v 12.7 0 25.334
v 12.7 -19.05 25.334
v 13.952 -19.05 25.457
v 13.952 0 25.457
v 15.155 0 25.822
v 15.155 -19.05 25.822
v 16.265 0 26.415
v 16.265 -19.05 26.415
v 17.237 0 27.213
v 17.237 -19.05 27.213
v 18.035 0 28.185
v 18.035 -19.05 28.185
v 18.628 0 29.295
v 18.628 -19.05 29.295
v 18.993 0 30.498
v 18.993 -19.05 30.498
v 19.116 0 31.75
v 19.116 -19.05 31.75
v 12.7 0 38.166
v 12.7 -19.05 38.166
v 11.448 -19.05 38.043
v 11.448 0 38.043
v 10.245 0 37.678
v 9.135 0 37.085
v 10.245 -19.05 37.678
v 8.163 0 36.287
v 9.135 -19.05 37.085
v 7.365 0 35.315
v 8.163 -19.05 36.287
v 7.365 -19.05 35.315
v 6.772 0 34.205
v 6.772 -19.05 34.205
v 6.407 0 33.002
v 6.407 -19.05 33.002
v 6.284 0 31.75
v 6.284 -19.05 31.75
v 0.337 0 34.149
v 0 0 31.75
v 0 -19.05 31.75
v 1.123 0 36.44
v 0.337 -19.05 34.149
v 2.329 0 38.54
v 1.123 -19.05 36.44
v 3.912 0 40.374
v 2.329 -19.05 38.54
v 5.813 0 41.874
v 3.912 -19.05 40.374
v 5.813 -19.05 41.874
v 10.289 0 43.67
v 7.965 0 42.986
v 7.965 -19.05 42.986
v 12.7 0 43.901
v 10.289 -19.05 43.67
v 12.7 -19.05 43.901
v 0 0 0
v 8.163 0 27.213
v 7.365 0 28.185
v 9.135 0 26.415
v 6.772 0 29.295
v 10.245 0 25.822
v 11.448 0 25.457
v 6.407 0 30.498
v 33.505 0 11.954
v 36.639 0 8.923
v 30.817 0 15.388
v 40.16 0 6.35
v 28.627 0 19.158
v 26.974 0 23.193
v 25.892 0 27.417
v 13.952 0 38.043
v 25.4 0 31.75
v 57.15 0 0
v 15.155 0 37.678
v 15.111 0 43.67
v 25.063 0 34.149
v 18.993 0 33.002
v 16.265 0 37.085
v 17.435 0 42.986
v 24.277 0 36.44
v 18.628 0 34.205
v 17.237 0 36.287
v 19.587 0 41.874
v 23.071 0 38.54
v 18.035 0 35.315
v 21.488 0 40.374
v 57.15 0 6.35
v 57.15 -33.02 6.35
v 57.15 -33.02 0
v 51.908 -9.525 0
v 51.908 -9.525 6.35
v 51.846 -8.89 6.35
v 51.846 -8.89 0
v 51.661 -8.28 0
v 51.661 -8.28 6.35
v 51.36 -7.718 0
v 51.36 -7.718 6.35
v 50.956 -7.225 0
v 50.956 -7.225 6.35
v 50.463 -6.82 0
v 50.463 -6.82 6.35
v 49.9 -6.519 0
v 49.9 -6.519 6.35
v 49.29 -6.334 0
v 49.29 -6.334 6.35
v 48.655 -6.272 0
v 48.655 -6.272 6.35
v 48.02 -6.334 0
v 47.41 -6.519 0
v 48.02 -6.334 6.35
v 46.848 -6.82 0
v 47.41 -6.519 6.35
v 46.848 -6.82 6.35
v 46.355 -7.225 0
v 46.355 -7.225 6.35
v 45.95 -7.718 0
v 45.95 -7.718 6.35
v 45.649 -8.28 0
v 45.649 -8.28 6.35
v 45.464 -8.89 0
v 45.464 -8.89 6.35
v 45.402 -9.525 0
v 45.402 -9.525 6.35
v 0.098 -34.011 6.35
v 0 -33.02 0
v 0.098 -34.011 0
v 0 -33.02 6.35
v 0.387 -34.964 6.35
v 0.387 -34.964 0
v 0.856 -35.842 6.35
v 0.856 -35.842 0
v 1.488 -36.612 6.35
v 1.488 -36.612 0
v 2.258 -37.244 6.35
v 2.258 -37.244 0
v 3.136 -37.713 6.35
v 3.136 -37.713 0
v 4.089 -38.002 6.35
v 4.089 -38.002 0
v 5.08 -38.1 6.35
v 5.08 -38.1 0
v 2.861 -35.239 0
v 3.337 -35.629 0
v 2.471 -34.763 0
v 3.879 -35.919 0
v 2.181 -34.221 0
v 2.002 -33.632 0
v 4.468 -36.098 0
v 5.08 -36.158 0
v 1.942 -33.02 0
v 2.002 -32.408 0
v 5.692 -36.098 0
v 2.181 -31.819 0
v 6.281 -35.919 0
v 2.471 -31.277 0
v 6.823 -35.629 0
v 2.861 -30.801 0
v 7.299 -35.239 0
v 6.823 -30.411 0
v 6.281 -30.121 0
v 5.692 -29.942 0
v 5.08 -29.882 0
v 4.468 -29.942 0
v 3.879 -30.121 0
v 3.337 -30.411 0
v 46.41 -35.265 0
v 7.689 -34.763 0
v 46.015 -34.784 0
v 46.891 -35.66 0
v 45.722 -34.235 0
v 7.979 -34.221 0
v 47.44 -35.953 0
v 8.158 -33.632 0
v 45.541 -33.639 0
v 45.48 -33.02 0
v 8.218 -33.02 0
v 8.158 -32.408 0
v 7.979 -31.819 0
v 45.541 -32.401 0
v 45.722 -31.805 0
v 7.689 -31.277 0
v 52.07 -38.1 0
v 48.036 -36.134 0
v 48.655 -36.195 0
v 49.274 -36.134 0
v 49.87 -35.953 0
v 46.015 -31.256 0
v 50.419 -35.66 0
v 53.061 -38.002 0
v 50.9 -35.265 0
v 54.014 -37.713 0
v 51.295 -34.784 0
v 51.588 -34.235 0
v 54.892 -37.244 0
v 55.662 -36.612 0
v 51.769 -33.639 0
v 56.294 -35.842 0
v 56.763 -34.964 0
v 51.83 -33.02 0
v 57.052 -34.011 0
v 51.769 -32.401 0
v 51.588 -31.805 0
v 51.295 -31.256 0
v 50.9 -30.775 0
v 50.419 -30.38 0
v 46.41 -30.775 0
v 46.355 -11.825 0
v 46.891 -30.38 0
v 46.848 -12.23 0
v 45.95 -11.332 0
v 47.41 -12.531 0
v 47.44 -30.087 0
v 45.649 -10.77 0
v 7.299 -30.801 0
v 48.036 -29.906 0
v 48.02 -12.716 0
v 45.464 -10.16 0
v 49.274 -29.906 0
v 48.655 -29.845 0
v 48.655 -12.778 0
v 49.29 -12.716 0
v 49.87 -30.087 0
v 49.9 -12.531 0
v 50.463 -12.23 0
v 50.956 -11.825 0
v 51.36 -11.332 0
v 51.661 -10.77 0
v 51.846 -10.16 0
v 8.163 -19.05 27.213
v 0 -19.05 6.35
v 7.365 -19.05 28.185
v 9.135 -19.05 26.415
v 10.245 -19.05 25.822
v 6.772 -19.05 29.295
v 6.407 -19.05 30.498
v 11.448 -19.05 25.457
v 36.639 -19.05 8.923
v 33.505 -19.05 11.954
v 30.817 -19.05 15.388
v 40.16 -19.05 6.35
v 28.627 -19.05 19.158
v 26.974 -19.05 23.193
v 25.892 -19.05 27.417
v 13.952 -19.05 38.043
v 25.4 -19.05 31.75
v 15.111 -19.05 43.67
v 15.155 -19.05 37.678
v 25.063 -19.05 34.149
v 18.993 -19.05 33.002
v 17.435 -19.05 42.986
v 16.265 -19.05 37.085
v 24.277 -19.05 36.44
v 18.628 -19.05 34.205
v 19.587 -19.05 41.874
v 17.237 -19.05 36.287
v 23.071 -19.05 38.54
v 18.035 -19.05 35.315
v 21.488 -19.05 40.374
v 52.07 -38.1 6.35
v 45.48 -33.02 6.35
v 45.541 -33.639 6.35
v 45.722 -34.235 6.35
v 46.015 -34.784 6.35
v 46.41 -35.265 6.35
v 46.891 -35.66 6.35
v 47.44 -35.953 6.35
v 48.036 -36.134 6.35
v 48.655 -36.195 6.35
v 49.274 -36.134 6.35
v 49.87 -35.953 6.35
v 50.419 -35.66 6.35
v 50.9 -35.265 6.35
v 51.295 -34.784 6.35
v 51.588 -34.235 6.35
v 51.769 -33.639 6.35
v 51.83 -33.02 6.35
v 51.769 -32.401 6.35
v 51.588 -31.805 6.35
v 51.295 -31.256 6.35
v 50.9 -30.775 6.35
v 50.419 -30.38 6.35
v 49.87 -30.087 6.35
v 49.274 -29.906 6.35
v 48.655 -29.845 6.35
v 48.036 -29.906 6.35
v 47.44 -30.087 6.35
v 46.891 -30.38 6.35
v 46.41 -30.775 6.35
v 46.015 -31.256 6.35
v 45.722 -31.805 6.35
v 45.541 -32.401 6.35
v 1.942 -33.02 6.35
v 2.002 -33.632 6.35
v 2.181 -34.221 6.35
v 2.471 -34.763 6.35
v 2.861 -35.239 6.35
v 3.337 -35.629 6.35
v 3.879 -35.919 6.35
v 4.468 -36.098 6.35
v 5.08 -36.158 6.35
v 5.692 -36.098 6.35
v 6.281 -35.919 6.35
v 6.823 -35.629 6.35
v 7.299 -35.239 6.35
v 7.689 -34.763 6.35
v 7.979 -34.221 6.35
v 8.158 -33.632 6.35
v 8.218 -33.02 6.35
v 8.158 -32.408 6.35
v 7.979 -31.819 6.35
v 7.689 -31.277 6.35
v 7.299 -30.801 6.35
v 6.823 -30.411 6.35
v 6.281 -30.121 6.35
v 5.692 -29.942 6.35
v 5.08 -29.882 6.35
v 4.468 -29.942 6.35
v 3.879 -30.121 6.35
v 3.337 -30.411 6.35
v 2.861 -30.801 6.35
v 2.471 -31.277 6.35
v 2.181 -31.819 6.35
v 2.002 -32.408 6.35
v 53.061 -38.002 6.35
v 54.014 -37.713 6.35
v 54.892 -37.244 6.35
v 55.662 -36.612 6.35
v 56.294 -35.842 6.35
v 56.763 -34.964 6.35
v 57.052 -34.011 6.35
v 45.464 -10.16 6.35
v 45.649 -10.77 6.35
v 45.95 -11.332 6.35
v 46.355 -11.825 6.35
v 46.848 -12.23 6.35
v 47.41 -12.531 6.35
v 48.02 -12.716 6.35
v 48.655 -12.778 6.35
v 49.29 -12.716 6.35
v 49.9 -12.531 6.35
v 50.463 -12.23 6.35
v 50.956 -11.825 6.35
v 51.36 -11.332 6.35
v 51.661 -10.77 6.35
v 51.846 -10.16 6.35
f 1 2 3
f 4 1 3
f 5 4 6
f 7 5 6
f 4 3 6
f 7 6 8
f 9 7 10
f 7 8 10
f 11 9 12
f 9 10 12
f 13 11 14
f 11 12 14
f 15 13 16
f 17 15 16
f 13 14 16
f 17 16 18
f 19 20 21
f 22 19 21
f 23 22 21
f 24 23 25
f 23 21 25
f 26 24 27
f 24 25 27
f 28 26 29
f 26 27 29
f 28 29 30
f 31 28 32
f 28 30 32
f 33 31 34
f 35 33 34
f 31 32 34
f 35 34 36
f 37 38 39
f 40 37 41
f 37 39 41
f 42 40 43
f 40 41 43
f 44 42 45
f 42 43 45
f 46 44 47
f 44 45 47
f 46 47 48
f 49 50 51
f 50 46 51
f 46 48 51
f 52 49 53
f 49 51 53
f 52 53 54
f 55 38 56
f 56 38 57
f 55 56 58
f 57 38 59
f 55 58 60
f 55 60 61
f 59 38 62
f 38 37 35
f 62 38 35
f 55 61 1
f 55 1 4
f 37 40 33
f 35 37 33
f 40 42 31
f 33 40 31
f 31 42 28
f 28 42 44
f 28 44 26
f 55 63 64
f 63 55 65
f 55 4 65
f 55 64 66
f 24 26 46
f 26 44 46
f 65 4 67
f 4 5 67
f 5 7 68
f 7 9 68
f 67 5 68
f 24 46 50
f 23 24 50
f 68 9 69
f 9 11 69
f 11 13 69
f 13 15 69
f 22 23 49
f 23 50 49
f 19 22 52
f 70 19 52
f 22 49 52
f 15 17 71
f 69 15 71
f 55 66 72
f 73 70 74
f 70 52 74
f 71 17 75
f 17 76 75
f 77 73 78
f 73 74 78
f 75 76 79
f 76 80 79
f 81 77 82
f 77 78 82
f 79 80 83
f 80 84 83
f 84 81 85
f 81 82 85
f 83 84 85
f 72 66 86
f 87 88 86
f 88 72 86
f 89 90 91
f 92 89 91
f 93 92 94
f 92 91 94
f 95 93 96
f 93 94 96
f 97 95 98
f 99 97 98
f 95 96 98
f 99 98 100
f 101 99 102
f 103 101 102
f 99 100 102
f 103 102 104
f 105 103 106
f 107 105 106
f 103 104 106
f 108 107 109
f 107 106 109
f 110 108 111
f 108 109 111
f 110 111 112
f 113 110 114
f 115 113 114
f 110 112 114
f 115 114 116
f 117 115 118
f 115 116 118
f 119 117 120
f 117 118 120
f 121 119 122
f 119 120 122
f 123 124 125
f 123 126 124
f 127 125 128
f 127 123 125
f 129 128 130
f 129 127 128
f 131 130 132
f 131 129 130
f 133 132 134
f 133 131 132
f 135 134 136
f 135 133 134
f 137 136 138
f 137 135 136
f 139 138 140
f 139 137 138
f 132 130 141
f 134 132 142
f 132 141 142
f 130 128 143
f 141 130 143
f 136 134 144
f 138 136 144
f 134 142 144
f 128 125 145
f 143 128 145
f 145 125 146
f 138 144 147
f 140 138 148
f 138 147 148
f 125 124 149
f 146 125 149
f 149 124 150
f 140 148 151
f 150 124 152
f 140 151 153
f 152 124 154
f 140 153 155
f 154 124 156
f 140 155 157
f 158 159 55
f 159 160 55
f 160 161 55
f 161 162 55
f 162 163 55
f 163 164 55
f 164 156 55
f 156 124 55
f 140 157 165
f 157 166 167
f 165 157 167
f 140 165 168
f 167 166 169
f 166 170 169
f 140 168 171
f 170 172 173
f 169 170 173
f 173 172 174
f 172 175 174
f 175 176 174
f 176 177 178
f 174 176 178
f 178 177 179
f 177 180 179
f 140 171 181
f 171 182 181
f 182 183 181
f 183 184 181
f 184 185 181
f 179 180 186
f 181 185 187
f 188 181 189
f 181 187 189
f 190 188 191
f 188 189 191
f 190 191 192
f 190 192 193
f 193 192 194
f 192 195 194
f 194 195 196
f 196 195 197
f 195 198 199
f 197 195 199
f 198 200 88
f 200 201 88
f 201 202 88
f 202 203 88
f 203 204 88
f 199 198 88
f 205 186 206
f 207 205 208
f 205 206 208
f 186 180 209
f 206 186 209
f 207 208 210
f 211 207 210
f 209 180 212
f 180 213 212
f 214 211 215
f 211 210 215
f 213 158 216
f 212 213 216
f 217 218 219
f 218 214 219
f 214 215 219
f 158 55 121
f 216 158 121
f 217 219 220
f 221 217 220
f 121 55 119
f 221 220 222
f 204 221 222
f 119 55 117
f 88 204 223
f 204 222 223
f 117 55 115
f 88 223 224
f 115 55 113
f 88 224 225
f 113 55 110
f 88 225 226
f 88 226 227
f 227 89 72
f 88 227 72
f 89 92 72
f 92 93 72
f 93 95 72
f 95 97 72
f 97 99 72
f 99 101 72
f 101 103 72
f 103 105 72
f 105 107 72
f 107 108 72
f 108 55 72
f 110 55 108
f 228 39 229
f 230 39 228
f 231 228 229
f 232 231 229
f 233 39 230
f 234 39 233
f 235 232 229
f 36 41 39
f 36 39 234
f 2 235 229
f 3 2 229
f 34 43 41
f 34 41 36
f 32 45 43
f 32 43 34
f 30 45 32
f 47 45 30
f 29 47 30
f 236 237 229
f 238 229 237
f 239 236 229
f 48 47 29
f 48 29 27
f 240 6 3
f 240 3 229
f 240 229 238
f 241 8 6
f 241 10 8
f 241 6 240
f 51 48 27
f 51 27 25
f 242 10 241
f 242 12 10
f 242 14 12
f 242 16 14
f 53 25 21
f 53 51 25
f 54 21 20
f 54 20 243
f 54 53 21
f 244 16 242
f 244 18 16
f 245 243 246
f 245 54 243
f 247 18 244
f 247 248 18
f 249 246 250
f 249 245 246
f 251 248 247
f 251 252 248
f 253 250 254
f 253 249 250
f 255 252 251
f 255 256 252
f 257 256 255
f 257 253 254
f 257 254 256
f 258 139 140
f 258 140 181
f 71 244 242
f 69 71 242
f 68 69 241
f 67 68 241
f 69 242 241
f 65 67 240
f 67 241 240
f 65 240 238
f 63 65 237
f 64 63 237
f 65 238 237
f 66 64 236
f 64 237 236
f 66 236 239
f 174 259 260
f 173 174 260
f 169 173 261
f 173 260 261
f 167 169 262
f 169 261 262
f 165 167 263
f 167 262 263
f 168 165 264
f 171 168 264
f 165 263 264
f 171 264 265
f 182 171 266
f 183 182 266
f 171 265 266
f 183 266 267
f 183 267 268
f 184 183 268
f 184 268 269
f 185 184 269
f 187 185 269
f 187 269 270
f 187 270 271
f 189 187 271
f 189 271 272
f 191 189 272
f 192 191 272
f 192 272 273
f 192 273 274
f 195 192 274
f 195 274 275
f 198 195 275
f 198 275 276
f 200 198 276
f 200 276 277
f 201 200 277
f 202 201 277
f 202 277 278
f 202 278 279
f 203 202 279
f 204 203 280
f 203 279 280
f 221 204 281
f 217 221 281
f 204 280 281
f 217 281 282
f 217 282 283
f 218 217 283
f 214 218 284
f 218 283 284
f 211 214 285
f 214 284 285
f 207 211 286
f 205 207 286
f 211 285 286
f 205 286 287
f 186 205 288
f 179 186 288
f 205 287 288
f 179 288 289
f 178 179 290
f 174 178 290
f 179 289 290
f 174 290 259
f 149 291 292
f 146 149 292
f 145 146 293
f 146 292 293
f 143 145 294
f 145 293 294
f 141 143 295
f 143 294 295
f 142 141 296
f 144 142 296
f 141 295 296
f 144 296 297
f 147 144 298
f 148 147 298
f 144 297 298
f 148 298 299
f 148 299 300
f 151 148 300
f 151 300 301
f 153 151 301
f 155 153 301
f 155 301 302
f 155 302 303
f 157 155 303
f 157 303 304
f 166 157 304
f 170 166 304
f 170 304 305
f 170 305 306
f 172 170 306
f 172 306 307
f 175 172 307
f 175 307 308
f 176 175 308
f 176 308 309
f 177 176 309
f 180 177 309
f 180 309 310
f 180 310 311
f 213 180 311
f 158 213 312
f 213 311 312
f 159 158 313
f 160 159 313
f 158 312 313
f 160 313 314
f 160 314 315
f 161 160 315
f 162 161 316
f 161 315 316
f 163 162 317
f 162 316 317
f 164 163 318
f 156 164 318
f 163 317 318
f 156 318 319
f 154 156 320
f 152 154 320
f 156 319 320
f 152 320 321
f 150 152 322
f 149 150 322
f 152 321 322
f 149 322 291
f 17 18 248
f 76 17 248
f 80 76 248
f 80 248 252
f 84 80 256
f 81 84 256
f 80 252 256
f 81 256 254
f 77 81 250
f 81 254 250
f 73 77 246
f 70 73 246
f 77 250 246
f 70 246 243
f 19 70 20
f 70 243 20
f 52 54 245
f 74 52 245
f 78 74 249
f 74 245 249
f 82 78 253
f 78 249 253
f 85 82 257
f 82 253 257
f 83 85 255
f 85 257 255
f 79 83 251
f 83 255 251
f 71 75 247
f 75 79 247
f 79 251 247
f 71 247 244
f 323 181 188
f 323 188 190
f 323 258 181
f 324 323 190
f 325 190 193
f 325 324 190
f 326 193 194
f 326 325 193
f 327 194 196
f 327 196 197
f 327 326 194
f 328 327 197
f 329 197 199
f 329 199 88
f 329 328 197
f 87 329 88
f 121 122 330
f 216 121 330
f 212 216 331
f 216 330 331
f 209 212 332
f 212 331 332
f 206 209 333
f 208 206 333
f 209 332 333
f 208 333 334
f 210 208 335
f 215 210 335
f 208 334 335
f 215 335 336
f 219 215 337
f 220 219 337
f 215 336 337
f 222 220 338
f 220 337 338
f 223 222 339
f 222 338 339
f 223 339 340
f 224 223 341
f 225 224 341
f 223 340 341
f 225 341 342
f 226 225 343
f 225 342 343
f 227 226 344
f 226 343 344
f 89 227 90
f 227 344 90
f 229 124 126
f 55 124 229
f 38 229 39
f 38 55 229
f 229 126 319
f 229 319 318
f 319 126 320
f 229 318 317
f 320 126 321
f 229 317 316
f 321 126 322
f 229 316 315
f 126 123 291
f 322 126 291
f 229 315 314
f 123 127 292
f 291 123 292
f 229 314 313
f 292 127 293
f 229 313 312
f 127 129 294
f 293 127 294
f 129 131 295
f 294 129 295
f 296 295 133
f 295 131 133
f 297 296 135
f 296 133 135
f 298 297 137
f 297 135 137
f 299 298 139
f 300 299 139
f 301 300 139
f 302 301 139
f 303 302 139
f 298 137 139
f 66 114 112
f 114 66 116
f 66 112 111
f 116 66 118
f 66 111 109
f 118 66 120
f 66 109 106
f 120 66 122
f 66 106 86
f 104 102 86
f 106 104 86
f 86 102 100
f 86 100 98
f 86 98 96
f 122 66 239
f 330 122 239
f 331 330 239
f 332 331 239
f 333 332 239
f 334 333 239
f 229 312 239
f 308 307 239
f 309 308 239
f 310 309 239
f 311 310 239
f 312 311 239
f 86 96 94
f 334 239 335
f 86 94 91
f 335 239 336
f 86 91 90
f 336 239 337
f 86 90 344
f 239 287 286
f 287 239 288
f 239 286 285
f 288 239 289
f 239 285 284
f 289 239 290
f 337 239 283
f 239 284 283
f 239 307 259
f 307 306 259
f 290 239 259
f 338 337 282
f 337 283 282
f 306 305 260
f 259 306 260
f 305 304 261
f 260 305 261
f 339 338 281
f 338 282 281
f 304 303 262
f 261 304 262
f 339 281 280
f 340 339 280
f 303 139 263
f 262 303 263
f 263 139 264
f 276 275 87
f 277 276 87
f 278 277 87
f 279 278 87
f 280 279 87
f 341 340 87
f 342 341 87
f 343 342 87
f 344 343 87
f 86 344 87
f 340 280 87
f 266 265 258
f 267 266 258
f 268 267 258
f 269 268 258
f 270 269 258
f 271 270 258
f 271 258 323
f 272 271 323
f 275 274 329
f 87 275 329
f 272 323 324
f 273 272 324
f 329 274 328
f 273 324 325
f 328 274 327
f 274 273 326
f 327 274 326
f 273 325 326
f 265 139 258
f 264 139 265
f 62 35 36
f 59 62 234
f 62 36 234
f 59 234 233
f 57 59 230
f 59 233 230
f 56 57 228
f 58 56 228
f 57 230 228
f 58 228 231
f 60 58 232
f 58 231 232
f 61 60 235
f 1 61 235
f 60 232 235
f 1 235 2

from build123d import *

# Parameters (mm, degrees)
F0_W     = 57.15
F0_H     = 44.45
F1_DEPTH = 38.1
F2_W     = 57.15
F2_H     = 38.1
F3_DEPTH = 19.05
F4_R     = 5.08
F5_W     = 31.75
F5_H     = 12.7
F6_DEPTH = 19.051
F8_DEPTH = 6.351


with BuildPart() as f1:
    # F0 (on Front) → F1 (new body)
    with BuildSketch(Plane.XZ):
        with Locations((28.575, 22.225)):
            Rectangle(F0_W, F0_H)
    extrude(amount=F1_DEPTH)

    # F2 (on face) → F3 (cut)
    with BuildSketch(Plane.XZ.offset(38.1)):
        with Locations((28.575, 25.4)):
            Rectangle(F2_W, F2_H)
    extrude(amount=-F3_DEPTH, mode=Mode.SUBTRACT)

    # F4
    f4_edges = [f1.edges().sort_by_distance(p)[0] for p in [
        (0, -38.1, 3.175),
        (57.15, -38.1, 3.175),
    ]]
    fillet(f4_edges, radius=F4_R)

    # F5 (on face) → F6 (cut, through all)
    with BuildSketch(Plane.XZ.offset(19.05)):
        with BuildLine():
            Line((12.7, 31.75), (12.7, 38.1659469176))
            ThreePointArc((12.7, 38.1659469176), (8.1632404269, 36.2867595731), (6.2840530824, 31.75))
            Line((6.2840530824, 31.75), (12.7, 31.75))
        make_face()
        with BuildLine():
            ThreePointArc((19.1159469176, 31.75), (17.2367595731, 36.2867595731), (12.7, 38.1659469176))
            Line((12.7, 38.1659469176), (12.7, 31.75))
            Line((12.7, 31.75), (19.1159469176, 31.75))
        make_face()
        with BuildLine():
            Line((12.7, 25.3340530824), (12.7, 31.75))
            Line((12.7, 31.75), (6.2840530824, 31.75))
            ThreePointArc((6.2840530824, 31.75), (8.1632404269, 27.2132404269), (12.7, 25.3340530824))
        make_face()
        with BuildLine():
            Line((19.1159469176, 31.75), (12.7, 31.75))
            Line((12.7, 31.75), (12.7, 25.3340530824))
            ThreePointArc((12.7, 25.3340530824), (17.2367595731, 27.2132404269), (19.1159469176, 31.75))
        make_face()
        with BuildLine():
            Line((12.7, 43.9009574959), (12.7, 44.45))
            Line((12.7, 44.45), (0, 44.45))
            Line((0, 44.45), (0, 31.75))
            ThreePointArc((0, 31.75), (3.9117156386, 40.3739372872), (12.7, 43.9009574959))
        make_face()
        with BuildLine():
            Line((25.4, 44.45), (12.7, 44.45))
            Line((12.7, 44.45), (12.7, 43.9009574959))
            ThreePointArc((12.7, 43.9009574959), (21.4882843614, 40.3739372872), (25.4, 31.75))
            Line((25.4, 31.75), (25.4, 44.45))
        make_face()
        with BuildLine():
            Line((57.15, 31.75), (25.4, 31.75))
            ThreePointArc((25.4, 31.75), (29.6571125542, 17.2352579477), (40.1600599289, 6.35))
            Line((40.1600599289, 6.35), (57.15, 6.35))
            Line((57.15, 6.35), (57.15, 31.75))
        make_face()
        with Locations((41.275, 38.1)):
            Rectangle(F5_W, F5_H)
    extrude(amount=-F6_DEPTH, mode=Mode.SUBTRACT)

    # F7 (on face) → F8 (cut, through all)
    with BuildSketch(Plane.XY.offset(6.35)):
        with BuildLine():
            Line((1.9419096436, -33.02), (8.2180903564, -33.02))
            ThreePointArc((8.2180903564, -33.02), (5.08, -29.8819096436), (1.9419096436, -33.02))
        make_face()
        with BuildLine():
            ThreePointArc((1.9419096436, -33.02), (5.08, -36.1580903564), (8.2180903564, -33.02))
            Line((8.2180903564, -33.02), (1.9419096436, -33.02))
        make_face()
        with BuildLine():
            Line((45.4800299644, -33.02), (51.8300299644, -33.02))
            ThreePointArc((51.8300299644, -33.02), (48.6550299644, -29.845), (45.4800299644, -33.02))
        make_face()
        with BuildLine():
            ThreePointArc((45.4800299644, -33.02), (48.6550299644, -36.195), (51.8300299644, -33.02))
            Line((51.8300299644, -33.02), (45.4800299644, -33.02))
        make_face()
        with BuildLine():
            Line((45.4016557758, -9.525), (51.9084041531, -9.525))
            ThreePointArc((51.9084041531, -9.525), (48.6550299644, -6.2716258113), (45.4016557758, -9.525))
        make_face()
        with BuildLine():
            ThreePointArc((45.4016557758, -9.525), (48.6550299644, -12.7783741887), (51.9084041531, -9.525))
            Line((51.9084041531, -9.525), (45.4016557758, -9.525))
        make_face()
    extrude(amount=-F8_DEPTH, mode=Mode.SUBTRACT)


solid = f1.part
